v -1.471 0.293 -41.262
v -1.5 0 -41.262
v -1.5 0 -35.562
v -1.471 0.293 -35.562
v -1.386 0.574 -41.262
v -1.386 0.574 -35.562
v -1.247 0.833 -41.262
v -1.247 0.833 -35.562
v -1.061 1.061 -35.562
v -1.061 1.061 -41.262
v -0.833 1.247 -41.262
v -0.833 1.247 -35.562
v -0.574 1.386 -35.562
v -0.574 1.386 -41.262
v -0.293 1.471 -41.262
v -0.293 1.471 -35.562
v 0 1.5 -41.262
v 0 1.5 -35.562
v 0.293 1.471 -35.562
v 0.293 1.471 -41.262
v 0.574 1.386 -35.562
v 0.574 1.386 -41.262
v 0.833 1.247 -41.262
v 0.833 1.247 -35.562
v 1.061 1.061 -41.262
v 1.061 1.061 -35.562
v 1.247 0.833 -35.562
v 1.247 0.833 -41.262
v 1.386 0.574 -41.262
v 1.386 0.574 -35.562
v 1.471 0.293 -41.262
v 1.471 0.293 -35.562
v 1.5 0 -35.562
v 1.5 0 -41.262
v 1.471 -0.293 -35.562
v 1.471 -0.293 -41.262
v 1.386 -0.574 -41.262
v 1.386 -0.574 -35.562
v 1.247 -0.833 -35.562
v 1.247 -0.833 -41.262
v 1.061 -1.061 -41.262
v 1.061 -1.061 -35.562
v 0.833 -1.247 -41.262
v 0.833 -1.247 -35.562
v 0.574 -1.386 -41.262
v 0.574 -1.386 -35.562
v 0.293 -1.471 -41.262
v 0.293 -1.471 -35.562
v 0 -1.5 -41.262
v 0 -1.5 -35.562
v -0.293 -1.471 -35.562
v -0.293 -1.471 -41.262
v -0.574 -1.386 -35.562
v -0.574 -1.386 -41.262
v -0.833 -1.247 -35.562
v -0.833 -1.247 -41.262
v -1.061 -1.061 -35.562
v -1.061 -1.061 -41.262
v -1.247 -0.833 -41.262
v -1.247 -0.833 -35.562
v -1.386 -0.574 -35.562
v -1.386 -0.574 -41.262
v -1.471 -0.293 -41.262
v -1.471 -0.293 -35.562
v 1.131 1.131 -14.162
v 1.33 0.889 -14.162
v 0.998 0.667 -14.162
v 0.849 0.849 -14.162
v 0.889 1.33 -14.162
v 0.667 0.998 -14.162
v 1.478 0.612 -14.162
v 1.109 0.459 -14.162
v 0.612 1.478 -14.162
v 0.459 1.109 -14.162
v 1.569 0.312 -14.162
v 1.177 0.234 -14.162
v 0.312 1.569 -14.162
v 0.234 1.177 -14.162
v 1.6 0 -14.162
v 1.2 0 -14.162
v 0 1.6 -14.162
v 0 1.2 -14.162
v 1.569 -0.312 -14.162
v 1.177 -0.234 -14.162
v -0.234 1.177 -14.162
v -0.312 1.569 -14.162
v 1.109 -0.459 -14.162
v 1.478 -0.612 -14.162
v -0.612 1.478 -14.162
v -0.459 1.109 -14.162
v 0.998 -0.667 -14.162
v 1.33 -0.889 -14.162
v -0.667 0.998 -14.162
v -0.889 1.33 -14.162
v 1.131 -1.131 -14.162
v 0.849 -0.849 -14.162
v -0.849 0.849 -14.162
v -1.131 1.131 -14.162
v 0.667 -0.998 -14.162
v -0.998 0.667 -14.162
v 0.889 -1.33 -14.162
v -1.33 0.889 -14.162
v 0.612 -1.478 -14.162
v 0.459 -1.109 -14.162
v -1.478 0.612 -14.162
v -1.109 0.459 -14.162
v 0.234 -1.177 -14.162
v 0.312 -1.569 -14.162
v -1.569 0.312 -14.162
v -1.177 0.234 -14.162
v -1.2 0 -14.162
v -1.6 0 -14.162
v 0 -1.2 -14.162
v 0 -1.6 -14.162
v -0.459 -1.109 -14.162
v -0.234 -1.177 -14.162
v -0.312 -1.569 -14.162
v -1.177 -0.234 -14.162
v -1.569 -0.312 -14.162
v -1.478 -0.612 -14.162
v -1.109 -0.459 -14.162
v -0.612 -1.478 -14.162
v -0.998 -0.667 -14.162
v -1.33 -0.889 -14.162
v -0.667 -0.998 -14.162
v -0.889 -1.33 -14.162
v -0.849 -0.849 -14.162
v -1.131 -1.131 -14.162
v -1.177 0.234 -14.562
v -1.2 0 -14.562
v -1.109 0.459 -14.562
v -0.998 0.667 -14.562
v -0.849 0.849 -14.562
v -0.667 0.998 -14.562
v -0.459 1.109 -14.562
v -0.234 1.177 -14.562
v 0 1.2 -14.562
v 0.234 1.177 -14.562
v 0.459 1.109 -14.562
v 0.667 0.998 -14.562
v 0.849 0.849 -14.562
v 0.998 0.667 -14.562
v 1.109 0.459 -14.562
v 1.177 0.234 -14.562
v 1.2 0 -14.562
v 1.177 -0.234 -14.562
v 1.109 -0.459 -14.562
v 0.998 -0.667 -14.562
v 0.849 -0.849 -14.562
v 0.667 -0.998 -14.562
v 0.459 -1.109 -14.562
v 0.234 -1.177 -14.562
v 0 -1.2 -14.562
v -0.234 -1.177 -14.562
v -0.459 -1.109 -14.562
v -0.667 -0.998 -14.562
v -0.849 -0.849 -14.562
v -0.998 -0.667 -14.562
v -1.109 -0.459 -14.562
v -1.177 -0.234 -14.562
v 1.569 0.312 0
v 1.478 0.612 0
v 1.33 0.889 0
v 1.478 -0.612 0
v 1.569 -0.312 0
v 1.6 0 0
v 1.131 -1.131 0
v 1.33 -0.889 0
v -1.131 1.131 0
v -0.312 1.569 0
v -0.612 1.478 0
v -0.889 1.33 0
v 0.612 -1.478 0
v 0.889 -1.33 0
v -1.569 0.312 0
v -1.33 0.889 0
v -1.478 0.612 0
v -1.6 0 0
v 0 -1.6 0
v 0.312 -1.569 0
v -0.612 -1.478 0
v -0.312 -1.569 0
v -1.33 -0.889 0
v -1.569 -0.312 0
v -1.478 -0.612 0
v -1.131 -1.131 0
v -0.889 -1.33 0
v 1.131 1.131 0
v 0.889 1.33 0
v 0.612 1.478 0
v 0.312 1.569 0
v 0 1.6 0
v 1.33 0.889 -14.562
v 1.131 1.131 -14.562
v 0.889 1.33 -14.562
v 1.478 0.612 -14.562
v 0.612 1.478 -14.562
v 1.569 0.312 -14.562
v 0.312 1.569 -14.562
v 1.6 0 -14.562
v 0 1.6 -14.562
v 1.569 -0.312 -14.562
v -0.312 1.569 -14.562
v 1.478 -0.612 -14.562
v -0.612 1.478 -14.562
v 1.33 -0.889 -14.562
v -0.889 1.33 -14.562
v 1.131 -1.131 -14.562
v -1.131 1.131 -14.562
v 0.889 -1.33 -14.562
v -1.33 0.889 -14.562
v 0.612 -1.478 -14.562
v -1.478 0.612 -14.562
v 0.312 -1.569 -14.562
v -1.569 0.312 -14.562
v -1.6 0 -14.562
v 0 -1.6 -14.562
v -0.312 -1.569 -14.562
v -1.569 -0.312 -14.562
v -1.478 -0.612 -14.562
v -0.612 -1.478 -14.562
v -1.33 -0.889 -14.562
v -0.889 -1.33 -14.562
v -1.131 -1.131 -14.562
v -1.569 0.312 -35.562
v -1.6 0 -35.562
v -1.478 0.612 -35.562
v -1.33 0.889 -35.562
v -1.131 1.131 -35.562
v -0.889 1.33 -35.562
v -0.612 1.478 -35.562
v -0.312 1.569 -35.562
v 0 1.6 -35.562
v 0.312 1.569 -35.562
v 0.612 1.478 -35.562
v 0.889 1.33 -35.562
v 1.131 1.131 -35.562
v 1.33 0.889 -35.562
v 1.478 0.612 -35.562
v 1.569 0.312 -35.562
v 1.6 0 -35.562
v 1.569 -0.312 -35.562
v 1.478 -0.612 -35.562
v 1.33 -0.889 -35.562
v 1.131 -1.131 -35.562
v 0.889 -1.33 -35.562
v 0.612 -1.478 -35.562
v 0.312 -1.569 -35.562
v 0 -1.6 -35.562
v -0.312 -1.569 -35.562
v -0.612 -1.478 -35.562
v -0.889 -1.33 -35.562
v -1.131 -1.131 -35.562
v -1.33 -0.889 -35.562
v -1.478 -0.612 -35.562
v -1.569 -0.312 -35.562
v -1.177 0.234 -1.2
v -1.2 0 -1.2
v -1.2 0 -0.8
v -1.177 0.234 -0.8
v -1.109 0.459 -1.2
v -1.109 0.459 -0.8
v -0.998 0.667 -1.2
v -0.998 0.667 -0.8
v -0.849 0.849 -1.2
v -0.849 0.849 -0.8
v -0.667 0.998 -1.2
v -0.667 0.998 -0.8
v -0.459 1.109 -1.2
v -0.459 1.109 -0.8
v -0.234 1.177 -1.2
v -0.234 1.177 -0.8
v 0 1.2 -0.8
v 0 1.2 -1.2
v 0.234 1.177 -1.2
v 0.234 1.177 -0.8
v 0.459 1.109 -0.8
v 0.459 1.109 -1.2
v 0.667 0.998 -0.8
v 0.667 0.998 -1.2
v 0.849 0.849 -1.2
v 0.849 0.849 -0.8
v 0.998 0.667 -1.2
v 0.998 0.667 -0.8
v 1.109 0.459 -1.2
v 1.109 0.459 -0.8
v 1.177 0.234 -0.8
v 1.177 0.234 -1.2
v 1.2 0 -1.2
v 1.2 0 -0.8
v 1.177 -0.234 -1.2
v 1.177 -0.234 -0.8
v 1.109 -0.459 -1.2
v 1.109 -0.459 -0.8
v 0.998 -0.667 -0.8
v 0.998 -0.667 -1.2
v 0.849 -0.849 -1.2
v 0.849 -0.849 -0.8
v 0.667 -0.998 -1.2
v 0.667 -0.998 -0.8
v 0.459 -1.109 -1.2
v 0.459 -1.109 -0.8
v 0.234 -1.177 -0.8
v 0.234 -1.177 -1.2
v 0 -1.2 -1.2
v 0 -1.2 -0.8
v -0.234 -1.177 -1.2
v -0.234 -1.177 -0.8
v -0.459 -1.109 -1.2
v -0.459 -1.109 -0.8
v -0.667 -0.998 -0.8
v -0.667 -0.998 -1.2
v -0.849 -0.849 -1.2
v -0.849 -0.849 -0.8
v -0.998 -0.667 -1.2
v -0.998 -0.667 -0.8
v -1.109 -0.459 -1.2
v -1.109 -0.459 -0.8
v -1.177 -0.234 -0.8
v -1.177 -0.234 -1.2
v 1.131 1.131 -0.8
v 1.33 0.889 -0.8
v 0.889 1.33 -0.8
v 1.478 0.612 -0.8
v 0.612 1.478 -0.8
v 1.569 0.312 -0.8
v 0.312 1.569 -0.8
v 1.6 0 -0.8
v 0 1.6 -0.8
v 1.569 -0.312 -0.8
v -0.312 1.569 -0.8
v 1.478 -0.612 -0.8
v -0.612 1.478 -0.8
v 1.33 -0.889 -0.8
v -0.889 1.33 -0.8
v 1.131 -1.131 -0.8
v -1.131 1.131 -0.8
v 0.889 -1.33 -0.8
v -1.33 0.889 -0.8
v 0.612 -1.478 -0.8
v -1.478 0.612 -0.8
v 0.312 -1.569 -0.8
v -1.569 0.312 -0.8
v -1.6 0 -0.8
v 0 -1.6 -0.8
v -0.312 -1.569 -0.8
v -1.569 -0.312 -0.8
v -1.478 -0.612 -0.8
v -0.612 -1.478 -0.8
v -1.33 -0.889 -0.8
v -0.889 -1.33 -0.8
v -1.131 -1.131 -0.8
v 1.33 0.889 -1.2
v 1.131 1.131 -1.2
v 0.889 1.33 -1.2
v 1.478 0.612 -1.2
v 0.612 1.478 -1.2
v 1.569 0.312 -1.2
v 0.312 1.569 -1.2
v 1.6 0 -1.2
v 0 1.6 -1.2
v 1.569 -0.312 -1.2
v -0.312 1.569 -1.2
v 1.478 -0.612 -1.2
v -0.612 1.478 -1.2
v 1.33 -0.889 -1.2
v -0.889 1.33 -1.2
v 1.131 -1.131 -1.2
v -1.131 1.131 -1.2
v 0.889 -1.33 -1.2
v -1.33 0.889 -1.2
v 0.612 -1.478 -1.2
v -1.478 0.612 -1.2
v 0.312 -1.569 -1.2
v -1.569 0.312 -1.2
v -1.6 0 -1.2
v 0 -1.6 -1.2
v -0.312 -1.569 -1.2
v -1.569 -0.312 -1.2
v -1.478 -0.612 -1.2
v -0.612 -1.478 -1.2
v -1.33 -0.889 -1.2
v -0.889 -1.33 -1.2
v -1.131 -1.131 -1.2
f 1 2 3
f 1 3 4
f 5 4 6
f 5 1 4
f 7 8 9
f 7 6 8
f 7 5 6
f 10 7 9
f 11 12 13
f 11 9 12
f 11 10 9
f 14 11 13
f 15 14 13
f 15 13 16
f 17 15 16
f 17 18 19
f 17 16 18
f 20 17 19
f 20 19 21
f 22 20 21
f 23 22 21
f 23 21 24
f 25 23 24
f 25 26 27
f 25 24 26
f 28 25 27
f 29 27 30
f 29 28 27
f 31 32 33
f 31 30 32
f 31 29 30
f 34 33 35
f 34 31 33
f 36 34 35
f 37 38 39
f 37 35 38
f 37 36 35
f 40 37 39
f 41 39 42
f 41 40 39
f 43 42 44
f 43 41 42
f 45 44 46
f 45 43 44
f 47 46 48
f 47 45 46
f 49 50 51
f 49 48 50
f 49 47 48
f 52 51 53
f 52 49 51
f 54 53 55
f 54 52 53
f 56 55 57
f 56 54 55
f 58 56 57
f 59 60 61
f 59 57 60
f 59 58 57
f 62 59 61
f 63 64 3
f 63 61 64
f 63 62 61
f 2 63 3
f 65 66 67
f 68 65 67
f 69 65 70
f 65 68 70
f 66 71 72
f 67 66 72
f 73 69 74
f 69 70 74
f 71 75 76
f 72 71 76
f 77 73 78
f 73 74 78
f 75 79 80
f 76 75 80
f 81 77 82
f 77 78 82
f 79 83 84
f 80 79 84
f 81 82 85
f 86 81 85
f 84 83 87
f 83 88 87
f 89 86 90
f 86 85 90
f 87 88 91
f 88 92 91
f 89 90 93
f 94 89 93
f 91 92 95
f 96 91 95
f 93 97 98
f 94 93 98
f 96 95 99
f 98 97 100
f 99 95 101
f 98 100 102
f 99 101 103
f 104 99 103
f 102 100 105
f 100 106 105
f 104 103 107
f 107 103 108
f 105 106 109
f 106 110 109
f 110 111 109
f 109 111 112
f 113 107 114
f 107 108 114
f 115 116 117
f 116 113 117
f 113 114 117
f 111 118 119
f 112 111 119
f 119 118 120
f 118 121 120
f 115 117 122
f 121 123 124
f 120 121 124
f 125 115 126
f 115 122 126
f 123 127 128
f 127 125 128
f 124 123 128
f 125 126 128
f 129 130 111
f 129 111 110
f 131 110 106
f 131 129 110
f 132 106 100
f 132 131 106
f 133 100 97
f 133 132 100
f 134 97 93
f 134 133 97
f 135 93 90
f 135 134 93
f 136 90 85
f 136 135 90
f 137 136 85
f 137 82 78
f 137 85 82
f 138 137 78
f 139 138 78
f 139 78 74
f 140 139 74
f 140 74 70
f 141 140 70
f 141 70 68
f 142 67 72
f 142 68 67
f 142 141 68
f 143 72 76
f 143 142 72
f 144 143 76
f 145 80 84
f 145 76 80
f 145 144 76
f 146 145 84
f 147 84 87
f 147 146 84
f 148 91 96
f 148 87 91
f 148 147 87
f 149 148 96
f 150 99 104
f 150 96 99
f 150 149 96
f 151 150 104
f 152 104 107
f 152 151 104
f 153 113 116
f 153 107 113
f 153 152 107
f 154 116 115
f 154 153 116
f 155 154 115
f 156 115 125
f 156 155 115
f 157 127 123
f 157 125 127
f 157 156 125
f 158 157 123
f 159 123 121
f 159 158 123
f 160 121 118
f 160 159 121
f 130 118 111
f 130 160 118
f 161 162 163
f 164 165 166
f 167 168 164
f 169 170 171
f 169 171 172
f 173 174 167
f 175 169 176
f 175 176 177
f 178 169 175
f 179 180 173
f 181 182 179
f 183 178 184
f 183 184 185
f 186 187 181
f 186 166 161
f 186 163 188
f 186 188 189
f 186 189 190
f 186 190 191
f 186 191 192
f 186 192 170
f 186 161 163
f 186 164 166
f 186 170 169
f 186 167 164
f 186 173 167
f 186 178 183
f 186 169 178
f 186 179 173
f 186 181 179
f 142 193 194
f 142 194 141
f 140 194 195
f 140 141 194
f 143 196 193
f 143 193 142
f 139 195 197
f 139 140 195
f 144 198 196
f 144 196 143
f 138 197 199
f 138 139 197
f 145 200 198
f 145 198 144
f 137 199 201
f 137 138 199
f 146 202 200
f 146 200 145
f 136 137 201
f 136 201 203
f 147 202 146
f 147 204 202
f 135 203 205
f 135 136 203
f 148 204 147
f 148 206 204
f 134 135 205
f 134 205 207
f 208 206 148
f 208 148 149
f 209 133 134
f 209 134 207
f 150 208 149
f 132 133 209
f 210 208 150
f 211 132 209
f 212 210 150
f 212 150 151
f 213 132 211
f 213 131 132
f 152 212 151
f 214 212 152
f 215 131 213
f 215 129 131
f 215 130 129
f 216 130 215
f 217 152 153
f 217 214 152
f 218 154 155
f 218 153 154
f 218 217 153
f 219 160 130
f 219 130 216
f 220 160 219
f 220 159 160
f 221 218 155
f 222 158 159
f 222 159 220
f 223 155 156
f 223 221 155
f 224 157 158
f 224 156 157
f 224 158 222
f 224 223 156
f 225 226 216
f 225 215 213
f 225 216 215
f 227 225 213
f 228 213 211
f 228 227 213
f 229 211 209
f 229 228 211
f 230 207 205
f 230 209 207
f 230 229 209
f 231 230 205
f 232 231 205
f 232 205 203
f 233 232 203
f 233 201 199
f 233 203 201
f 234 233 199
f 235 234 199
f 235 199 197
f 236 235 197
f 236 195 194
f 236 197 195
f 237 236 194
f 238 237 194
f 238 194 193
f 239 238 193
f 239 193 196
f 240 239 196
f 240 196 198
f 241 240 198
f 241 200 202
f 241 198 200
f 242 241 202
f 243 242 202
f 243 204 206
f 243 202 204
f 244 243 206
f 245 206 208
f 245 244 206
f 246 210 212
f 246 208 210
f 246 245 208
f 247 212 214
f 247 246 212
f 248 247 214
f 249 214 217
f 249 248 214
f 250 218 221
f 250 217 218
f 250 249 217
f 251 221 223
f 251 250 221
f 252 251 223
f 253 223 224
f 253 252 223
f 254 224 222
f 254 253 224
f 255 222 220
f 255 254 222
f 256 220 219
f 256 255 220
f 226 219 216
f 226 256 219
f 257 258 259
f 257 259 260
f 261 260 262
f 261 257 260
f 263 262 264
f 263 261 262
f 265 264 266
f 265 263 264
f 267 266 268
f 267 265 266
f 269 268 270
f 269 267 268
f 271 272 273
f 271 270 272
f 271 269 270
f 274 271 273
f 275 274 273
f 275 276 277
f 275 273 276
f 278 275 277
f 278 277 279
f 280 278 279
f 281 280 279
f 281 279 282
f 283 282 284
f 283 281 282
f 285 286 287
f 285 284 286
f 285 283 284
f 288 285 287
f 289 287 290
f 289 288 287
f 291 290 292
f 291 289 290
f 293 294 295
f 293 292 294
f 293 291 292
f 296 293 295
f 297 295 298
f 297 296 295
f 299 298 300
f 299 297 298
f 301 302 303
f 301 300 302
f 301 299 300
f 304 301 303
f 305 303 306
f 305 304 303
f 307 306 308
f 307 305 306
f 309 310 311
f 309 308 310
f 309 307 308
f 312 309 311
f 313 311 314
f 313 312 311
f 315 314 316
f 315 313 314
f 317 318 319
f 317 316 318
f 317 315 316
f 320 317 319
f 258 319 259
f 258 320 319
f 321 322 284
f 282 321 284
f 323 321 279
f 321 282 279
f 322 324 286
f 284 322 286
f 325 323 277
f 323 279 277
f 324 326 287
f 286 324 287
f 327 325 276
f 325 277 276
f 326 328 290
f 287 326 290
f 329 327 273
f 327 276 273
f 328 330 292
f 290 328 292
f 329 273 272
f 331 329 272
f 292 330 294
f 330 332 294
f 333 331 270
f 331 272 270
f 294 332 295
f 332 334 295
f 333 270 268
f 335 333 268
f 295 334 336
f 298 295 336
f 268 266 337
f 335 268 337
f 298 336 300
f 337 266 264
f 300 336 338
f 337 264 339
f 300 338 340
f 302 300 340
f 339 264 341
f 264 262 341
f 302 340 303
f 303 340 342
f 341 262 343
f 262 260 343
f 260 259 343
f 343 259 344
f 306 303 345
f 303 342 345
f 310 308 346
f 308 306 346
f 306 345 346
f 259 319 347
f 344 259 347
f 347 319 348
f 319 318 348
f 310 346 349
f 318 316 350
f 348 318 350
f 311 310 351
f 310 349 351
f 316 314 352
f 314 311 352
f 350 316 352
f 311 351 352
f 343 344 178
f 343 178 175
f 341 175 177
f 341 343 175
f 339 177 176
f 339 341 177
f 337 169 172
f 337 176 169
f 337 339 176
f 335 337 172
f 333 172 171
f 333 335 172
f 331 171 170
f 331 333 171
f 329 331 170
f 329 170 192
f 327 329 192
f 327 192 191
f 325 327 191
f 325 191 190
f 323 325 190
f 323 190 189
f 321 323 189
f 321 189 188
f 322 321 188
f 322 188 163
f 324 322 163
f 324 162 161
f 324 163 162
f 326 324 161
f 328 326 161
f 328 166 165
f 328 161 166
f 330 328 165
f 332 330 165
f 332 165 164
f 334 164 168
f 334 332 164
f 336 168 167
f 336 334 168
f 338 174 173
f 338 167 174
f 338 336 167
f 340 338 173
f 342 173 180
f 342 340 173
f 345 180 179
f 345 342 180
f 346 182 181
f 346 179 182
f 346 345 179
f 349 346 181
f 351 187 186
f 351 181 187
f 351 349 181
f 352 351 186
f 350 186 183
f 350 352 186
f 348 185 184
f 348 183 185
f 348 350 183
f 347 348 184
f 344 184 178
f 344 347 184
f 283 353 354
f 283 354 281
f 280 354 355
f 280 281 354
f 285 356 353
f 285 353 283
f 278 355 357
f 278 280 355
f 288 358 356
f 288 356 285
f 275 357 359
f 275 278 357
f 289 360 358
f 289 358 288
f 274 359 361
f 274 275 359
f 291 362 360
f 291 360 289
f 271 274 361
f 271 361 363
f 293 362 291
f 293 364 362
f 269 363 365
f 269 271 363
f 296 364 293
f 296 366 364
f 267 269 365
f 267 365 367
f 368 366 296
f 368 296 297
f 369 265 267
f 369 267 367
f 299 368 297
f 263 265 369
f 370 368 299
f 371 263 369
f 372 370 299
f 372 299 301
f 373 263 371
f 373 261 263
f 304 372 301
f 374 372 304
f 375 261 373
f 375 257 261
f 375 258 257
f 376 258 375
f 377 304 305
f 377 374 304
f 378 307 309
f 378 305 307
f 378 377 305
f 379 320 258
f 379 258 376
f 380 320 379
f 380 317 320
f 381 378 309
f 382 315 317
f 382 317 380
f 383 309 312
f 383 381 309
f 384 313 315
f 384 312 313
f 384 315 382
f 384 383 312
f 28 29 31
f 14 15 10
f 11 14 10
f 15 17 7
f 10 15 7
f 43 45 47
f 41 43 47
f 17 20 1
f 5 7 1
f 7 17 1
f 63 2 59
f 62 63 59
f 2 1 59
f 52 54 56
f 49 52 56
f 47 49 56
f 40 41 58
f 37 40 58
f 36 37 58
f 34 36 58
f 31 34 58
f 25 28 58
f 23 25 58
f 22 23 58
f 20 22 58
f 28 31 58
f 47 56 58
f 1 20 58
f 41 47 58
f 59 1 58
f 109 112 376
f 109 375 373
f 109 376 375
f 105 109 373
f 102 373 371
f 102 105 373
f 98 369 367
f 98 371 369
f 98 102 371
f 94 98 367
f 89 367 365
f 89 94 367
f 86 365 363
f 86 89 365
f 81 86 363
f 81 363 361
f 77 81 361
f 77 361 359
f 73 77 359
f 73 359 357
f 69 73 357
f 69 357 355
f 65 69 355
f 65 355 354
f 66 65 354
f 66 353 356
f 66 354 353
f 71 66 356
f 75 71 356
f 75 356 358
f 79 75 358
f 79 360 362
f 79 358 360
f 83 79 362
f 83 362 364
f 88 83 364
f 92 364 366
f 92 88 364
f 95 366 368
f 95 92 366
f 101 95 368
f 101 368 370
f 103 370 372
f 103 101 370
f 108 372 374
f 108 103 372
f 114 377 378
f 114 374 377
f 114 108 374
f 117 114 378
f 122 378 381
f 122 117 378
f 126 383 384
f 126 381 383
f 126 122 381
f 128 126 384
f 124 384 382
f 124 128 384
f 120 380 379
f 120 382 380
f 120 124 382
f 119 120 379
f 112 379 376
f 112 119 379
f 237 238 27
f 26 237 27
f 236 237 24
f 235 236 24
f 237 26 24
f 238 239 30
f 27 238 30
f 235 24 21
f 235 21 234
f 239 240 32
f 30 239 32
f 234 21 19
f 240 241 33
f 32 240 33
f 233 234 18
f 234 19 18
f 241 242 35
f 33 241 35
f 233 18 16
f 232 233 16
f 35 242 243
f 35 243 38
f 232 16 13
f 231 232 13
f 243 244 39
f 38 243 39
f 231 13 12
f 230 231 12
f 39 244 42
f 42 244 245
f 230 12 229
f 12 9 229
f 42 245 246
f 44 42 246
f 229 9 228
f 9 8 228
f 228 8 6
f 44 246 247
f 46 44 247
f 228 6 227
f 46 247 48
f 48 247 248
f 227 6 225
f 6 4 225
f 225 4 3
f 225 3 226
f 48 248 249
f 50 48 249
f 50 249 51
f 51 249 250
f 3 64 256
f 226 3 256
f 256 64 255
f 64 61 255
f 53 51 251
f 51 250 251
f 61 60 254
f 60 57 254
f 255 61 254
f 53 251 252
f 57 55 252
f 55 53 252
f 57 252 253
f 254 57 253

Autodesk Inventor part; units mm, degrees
ref_plane "YZ Plane" through (0, 0, 0) normal (1, 0, 0) x (0, 1, 0)
ref_plane "XZ Plane" through (0, 0, 0) normal (0, 1, 0) x (-1, 0, 0)
ref_plane "XY Plane" through (0, 0, 0) normal (0, 0, 1) x (1, 0, 0)
sketch "Sketch1" plane through (0, 0, 0) normal (0, 1, 0) x (-1, 0, 0)
  line L0 (0, 0) -> (1.6, 0)
  line L1 (1.6, -41.2616) -> (0, -41.2616)
  line L2 (0, -41.2616) -> (0, 0)
  line L3 (1.6, -0.8) -> (1.2, -0.8)
  line L4 (1.2, -0.8) -> (1.2, -1.2)
  line L5 (1.2, -1.2) -> (1.6, -1.2)
  line L6 (1.6, -14.1616) -> (1.2, -14.1616)
  line L7 (1.2, -14.1616) -> (1.2, -14.5616)
  line L8 (1.2, -14.5616) -> (1.6, -14.5616)
  line L9 (1.6, -35.5616) -> (1.5, -35.5616)
  line L10 (1.5, -35.5616) -> (1.5, -41.2616)
  line L11 (1.5, -41.2616) -> (1.6, -41.2616)
  line L12 (1.6, -14.5616) -> (1.6, -35.5616)
  line L13 (1.6, 0) -> (1.6, -0.8)
  line L14 (1.6, -1.2) -> (1.6, -14.1616)
  dimension "d0" = 5.7
  dimension "d1" = 21.4
  dimension "d2" = 0.8
  dimension "d3" = 0.4
  dimension "d4" = 1.2
  dimension "d6" = 0.4
  dimension "d7" = 1.5
revolve "Revolution1" add sketch "Sketch1" angle 360 about axis through (0, 0, -41.2616) along (0, 0, 1)
thread "Thread1" size "M3x0.5" class "6g" standard "ANSI Metric M Profile" full length
properties part number "500-104" material "Steel"
